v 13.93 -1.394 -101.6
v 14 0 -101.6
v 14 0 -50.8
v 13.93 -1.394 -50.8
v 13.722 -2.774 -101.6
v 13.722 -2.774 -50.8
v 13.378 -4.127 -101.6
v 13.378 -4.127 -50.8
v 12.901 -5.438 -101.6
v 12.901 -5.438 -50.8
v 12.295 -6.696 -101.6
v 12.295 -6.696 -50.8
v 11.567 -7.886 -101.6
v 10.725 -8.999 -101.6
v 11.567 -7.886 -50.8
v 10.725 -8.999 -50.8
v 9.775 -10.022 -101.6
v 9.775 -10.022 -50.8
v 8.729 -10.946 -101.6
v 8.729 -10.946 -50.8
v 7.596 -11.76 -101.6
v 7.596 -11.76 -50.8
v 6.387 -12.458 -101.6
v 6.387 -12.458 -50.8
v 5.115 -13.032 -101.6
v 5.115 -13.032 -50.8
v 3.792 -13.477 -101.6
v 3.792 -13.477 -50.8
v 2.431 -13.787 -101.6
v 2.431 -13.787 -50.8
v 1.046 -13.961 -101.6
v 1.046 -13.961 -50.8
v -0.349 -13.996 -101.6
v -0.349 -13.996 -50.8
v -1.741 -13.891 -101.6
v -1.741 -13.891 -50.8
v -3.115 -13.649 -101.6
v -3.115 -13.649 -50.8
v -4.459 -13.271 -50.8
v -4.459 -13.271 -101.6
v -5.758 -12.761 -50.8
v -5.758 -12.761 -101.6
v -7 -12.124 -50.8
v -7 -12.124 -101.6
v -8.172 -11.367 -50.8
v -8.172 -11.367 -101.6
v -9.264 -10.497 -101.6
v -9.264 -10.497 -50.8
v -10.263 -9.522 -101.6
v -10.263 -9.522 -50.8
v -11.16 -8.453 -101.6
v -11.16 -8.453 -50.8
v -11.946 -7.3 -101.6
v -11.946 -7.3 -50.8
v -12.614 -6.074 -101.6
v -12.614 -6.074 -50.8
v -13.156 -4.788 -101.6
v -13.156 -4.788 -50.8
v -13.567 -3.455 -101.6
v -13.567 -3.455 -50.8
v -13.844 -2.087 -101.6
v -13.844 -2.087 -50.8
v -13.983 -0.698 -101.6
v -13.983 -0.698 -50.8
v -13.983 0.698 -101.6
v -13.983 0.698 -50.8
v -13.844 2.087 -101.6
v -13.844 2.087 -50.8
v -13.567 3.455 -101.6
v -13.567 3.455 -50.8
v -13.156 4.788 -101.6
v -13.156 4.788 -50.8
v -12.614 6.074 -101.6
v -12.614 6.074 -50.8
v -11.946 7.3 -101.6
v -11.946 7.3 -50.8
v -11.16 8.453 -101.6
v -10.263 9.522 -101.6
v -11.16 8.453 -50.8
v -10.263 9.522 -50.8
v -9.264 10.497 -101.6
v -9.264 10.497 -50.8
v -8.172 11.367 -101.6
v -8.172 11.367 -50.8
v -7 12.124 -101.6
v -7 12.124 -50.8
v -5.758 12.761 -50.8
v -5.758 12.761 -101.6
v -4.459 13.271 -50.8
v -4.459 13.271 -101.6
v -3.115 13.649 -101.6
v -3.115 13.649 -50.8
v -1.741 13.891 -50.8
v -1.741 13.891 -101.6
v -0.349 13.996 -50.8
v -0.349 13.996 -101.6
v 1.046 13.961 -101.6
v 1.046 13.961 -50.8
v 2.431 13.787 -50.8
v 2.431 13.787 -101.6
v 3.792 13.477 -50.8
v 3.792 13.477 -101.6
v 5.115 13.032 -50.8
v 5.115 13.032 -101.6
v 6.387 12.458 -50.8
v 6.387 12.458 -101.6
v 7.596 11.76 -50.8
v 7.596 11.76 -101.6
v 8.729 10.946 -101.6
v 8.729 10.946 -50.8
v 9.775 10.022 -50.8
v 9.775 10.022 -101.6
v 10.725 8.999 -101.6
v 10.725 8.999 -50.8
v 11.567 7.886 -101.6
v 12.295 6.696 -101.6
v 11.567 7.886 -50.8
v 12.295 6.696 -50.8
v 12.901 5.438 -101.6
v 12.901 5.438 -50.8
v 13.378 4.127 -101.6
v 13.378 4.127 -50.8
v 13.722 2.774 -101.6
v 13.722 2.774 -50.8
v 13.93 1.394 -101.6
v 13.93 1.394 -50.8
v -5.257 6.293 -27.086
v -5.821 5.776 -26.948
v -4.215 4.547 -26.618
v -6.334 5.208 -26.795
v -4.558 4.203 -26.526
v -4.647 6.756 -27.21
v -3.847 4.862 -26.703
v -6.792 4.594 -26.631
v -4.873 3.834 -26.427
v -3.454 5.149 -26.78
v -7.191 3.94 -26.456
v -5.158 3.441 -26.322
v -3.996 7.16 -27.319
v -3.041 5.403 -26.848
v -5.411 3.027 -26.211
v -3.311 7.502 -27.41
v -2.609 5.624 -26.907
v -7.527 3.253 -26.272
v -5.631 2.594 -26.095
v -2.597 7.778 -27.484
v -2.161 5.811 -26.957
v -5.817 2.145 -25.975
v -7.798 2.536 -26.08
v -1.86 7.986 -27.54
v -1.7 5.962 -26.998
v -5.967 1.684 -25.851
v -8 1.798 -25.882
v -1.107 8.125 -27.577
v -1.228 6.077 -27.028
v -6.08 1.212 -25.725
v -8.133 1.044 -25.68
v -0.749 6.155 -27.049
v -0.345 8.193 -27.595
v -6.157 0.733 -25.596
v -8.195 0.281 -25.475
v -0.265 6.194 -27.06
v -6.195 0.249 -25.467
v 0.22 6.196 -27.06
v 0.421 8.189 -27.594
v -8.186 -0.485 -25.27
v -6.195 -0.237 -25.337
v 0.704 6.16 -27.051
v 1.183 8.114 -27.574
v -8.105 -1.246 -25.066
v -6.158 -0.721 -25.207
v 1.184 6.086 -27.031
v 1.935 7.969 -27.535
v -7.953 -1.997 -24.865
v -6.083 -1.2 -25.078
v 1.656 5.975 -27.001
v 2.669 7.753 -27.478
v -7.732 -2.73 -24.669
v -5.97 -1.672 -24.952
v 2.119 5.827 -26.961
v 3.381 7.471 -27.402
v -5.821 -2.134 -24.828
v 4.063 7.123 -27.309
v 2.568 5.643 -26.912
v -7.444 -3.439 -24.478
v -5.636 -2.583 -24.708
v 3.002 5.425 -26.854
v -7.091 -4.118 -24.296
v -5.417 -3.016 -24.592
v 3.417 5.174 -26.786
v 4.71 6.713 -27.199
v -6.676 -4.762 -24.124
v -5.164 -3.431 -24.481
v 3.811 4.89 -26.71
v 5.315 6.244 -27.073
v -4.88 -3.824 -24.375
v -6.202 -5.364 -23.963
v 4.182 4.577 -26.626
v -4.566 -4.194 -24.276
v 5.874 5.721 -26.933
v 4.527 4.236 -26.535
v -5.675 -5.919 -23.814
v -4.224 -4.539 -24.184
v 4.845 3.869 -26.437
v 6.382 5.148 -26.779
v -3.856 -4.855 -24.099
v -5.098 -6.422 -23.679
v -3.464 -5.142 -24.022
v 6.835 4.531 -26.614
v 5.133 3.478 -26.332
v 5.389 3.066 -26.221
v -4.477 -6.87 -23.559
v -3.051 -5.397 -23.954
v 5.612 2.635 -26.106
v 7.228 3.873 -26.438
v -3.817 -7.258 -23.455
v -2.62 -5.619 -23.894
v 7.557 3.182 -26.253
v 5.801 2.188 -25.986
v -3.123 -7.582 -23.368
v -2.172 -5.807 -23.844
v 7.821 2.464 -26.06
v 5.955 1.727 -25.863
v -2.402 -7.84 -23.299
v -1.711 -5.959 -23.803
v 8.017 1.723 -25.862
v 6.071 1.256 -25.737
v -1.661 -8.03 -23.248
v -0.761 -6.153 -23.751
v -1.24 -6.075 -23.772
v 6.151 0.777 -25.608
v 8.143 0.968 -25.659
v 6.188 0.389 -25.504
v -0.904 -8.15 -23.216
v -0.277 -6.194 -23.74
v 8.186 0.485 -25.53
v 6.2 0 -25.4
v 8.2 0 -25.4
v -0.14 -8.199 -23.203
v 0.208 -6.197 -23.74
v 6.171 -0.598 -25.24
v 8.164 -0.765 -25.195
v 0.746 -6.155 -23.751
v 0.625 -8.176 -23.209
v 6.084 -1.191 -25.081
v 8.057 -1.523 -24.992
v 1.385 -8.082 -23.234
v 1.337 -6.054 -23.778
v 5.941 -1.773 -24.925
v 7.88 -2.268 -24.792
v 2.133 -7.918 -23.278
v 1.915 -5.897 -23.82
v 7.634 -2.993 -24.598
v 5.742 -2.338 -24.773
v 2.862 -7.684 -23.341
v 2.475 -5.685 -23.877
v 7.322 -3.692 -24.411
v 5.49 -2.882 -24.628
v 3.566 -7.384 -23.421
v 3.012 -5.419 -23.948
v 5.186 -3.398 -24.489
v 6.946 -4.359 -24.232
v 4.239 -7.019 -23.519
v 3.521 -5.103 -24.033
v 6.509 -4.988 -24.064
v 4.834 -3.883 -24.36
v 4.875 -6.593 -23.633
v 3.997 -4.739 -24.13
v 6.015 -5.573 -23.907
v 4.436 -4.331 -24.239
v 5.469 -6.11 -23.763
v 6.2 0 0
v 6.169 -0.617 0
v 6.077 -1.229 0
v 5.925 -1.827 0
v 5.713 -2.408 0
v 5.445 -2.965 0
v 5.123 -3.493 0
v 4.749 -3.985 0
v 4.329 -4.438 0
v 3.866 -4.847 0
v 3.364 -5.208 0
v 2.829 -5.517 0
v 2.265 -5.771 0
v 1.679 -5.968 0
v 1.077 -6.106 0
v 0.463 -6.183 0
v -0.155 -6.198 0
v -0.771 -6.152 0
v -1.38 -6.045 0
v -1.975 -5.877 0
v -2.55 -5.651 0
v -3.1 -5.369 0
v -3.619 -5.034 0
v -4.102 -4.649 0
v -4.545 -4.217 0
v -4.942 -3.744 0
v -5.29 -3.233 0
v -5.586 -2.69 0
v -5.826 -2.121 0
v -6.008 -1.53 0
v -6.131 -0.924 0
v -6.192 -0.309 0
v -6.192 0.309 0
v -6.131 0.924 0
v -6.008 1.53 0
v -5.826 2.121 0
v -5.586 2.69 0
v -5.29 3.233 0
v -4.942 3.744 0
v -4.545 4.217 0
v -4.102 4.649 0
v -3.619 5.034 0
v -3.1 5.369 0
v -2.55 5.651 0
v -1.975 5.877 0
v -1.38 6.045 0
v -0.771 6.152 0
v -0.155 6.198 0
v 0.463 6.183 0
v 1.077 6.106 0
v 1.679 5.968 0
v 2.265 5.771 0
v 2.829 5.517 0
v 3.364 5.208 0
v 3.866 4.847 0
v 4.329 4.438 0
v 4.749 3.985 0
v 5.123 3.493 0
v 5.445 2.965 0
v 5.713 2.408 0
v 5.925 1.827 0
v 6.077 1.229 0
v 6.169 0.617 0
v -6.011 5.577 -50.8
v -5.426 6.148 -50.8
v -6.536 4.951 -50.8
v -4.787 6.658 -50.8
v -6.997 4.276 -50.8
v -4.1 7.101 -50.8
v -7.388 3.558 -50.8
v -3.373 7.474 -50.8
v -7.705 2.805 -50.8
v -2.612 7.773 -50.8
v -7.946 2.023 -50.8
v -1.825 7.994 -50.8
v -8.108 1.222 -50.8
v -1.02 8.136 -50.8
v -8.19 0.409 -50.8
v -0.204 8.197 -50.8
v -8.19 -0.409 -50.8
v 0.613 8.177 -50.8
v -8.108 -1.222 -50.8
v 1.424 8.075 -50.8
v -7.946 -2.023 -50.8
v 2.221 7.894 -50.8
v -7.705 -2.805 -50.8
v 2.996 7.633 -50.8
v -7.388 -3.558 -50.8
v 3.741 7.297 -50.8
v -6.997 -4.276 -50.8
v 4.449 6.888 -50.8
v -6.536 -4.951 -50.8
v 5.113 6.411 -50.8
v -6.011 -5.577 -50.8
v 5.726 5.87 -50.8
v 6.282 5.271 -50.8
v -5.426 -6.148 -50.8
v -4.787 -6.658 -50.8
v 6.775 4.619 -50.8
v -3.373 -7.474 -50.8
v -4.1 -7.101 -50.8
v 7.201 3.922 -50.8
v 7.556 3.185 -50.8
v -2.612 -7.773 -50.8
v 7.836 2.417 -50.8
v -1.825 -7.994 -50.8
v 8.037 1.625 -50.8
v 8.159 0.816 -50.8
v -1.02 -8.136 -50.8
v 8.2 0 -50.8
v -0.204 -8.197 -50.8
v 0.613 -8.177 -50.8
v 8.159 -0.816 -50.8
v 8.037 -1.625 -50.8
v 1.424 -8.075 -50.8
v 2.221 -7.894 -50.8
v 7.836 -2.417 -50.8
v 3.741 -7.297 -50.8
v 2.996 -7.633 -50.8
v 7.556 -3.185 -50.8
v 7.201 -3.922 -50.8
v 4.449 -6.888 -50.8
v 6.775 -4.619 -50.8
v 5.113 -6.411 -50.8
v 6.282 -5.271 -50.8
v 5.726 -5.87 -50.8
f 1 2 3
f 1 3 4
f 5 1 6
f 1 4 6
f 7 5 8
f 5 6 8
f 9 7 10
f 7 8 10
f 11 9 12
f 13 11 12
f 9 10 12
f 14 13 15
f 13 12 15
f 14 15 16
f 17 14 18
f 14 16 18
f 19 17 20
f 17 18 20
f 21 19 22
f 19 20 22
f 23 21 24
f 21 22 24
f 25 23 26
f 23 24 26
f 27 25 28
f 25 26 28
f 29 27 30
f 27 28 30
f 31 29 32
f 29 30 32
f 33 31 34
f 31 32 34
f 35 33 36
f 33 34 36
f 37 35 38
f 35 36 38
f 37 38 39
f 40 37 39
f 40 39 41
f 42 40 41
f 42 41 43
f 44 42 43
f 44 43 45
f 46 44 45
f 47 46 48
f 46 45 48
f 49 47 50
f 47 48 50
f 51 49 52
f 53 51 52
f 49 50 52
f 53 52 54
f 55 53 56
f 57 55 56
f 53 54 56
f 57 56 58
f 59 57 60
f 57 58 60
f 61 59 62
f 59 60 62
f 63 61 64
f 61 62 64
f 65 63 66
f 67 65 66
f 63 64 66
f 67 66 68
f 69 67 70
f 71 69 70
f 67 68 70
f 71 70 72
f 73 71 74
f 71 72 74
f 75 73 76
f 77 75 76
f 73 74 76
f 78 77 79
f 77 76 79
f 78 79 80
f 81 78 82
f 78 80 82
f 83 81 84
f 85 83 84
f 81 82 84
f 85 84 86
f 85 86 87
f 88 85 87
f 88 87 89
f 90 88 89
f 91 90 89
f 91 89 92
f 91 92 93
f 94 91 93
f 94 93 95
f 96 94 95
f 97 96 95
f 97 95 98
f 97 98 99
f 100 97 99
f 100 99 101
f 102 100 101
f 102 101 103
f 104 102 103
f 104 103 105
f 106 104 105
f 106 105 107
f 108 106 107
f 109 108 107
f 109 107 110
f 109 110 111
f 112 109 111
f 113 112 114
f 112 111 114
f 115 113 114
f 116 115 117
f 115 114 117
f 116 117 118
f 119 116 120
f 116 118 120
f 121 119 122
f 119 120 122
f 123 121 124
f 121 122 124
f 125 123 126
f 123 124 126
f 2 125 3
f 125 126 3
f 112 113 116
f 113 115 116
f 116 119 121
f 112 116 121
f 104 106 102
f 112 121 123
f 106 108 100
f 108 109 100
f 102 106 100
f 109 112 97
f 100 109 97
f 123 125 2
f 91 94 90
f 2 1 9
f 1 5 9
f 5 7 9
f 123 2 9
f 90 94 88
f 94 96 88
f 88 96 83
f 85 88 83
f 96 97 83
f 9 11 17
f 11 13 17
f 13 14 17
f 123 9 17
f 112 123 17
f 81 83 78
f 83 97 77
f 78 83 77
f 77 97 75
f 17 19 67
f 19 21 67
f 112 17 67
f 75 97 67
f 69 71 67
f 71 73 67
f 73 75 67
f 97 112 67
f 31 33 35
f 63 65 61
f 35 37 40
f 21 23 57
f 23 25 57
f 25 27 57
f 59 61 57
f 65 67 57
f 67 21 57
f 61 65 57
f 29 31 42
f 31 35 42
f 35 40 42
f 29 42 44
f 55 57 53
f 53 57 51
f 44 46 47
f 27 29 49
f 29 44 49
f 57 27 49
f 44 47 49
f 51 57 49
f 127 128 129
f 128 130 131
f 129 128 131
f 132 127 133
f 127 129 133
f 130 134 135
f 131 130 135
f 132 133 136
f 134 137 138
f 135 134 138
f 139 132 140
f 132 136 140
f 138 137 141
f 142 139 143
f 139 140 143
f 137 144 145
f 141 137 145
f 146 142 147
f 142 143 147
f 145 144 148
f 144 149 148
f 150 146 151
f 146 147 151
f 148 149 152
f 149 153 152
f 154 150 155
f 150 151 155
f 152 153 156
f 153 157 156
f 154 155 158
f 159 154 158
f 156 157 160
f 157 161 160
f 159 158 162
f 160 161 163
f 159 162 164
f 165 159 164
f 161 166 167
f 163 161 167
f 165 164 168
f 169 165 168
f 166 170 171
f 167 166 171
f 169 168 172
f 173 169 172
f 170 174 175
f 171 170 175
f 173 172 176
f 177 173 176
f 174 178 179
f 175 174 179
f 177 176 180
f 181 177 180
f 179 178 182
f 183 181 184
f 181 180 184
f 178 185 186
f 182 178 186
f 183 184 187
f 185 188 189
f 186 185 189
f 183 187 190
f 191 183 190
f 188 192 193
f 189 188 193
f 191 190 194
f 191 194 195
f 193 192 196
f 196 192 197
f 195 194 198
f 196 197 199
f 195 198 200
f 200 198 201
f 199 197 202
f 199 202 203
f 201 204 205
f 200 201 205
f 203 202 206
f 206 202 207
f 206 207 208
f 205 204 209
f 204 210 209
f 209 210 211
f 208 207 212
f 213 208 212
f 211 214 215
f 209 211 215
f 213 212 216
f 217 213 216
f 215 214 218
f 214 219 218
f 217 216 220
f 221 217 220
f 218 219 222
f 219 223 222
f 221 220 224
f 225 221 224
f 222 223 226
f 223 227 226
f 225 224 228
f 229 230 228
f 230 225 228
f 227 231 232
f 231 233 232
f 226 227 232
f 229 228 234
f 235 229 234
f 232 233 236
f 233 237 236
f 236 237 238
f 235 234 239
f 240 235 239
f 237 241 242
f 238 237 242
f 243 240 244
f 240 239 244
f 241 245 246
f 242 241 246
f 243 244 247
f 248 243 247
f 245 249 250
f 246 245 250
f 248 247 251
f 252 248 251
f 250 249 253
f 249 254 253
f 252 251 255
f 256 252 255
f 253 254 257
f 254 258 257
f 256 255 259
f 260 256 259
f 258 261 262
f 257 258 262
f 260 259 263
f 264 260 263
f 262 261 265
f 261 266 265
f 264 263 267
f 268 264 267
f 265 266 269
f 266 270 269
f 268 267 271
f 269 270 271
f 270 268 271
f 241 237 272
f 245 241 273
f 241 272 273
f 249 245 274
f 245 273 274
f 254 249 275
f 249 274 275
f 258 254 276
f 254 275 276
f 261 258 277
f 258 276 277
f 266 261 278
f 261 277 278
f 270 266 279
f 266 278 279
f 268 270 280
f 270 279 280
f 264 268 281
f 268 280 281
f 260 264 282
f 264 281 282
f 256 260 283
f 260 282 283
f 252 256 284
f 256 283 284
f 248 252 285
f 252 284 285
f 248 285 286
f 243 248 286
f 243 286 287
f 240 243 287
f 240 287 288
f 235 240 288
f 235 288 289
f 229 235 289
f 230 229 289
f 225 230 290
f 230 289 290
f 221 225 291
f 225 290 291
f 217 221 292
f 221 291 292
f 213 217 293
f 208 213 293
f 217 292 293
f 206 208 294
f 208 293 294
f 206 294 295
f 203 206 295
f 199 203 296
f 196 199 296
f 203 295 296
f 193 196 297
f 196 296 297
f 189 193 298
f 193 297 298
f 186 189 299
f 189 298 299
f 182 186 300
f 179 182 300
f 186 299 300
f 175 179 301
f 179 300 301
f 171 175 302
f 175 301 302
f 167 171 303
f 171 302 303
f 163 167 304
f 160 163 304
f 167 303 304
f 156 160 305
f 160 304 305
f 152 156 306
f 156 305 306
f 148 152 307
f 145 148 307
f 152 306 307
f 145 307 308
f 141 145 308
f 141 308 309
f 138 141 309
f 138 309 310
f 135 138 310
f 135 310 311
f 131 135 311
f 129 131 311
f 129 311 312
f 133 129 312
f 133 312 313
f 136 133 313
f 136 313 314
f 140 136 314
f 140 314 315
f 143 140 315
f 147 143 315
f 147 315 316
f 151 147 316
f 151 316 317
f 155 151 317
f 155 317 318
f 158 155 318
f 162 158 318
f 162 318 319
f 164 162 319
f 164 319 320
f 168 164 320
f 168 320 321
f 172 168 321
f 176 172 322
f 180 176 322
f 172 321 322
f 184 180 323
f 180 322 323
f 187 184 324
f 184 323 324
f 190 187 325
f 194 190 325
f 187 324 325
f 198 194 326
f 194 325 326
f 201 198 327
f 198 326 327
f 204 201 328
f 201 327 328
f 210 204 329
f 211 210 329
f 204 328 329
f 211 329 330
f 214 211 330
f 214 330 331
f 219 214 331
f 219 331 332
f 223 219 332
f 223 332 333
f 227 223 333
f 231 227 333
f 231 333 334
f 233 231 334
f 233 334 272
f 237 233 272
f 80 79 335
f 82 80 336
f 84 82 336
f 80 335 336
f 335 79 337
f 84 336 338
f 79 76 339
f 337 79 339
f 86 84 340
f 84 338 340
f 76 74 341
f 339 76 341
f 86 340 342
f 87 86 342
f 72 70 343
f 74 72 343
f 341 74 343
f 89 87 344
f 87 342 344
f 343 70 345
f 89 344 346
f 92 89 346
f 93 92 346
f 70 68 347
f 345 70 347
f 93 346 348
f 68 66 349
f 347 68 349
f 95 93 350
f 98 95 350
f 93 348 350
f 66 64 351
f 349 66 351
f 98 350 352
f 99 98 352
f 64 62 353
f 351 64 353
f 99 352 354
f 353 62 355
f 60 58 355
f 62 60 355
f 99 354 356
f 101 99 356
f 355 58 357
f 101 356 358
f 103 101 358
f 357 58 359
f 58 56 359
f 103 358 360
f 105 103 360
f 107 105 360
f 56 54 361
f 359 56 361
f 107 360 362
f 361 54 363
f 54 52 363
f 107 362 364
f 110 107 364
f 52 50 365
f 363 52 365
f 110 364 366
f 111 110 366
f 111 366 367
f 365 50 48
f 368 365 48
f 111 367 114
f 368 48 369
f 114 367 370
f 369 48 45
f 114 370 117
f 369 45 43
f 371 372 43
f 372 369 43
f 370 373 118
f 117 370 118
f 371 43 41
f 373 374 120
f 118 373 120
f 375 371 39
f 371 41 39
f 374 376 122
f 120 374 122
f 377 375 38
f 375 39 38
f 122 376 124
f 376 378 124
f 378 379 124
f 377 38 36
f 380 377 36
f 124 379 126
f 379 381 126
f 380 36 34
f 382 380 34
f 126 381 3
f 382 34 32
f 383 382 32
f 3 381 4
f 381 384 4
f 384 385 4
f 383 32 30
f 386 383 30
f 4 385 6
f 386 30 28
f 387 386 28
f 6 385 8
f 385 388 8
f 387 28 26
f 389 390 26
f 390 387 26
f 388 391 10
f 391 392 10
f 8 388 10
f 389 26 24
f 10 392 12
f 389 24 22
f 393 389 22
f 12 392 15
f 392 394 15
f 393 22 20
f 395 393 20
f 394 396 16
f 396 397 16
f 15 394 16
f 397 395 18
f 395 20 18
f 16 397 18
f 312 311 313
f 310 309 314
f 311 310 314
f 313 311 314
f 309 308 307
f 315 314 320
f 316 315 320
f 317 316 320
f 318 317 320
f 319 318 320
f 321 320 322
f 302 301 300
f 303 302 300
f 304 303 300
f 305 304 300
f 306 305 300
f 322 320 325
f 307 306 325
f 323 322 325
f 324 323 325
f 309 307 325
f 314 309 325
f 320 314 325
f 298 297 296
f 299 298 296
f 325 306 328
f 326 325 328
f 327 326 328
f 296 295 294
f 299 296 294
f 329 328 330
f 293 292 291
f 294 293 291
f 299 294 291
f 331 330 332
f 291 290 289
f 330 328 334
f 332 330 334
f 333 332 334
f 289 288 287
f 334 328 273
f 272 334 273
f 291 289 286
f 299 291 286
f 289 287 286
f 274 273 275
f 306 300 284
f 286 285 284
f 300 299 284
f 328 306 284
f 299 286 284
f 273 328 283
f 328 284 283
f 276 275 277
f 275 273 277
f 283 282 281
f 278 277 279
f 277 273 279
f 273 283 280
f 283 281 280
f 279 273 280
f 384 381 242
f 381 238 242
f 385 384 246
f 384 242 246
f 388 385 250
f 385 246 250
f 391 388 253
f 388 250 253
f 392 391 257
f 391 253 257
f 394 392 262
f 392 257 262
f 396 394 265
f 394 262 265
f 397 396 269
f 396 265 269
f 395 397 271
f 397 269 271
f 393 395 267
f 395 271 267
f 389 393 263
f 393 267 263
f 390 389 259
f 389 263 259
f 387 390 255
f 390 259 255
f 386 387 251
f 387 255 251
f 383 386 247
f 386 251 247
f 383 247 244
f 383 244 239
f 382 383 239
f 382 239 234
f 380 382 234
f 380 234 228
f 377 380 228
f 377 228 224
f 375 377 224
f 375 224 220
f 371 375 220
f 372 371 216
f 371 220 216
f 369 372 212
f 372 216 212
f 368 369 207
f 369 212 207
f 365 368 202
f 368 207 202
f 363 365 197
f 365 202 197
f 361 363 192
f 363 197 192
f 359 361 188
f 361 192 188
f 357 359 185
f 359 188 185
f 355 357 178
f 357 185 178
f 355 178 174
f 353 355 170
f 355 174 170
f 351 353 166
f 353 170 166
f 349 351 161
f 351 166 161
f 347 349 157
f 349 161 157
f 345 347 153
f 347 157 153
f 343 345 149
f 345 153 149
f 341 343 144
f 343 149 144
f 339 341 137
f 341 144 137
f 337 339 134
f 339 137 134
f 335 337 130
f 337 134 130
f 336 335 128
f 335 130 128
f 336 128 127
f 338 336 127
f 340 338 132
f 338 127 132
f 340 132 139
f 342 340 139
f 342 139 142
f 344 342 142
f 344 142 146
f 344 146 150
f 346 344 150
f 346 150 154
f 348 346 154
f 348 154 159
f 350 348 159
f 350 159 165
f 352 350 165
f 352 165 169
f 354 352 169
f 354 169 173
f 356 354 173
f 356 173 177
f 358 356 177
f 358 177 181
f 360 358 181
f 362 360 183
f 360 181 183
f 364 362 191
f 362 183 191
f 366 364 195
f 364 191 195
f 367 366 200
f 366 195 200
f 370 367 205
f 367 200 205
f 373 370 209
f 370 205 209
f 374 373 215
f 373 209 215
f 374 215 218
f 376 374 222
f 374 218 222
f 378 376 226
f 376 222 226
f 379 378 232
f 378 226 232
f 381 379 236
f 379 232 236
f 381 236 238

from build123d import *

# Parameters (mm, degrees)
DRAFT1_ANGLE = 15


with BuildPart() as part:
    # Sketch4 → Revolve1 (revolve)
    with BuildSketch(Plane(origin=(0, 0, 0), x_dir=(1, 0, 0), z_dir=(0, 1, 0))):
        Polygon((0, 101.6), (14, 101.6), (14, 50.8), (8.2, 50.8), (8.2, 25.4), (6.2, 25.4), (6.2, 0), (0, 0), align=None)
    revolve(axis=Axis((0, 0, 0), (0, 0, -1)))

    # Draft1
    draft1_faces = [part.faces().sort_by_distance(p)[0] for p in [
        (-7.968068976, 0, -25.4),
    ]]
    draft(draft1_faces, Plane.ZX, DRAFT1_ANGLE)


solid = part.part
